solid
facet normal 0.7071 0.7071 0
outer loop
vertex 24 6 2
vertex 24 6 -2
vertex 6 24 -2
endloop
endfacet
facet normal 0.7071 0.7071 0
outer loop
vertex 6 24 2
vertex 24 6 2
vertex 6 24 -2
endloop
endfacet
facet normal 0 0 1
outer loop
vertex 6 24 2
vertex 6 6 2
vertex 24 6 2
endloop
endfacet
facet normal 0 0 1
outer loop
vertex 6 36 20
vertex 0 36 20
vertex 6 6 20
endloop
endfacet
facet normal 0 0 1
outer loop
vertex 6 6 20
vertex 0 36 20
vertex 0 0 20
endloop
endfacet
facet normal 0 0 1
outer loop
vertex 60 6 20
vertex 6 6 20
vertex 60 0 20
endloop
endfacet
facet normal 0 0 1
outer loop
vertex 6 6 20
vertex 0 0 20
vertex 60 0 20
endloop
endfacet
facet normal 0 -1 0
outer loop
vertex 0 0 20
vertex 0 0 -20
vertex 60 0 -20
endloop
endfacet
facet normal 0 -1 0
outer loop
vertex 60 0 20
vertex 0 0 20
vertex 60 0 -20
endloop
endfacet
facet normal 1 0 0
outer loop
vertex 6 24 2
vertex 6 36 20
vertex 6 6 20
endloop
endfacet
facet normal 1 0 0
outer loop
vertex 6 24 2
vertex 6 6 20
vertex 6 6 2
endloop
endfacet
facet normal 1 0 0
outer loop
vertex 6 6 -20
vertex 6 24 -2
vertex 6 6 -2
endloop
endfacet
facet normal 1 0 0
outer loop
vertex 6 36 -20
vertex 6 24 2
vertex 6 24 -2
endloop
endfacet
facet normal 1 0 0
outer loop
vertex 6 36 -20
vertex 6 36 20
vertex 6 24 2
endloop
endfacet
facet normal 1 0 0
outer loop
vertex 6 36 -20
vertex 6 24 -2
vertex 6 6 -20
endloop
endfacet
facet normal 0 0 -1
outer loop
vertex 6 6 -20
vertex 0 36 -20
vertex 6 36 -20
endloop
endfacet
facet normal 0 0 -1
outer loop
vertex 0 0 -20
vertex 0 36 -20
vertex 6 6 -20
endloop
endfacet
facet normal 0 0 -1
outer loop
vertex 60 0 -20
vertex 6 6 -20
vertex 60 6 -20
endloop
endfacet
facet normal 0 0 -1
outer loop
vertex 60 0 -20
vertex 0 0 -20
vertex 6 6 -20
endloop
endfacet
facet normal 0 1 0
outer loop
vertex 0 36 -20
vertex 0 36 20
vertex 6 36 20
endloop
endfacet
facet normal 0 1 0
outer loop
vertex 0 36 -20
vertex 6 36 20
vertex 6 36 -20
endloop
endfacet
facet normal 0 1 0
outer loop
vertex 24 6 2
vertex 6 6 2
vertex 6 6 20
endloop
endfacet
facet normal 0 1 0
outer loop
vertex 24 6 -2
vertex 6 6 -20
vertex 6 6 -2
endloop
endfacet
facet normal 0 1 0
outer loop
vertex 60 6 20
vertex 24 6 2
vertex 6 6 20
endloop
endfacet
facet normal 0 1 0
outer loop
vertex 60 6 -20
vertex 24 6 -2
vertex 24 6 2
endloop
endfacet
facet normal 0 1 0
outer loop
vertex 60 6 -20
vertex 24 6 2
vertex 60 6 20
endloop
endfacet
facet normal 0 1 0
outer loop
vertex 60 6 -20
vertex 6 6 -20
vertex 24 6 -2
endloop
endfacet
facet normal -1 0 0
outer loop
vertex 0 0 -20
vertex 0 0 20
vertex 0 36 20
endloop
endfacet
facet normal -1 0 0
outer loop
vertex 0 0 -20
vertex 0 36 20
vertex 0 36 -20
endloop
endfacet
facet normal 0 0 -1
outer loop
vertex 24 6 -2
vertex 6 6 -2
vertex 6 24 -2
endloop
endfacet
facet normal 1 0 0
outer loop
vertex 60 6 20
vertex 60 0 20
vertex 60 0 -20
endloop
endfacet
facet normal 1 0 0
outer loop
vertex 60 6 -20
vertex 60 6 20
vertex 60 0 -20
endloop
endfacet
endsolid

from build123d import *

# Parameters (mm, degrees)
SKETCH_1_W      = 60
SKETCH_1_H      = 40
EXTRUDE_1_DEPTH = 6
SKETCH_2_W      = 40
SKETCH_2_H      = 36
EXTRUDE_2_DEPTH = 6
EXTRUDE_START   = -2
EXTRUDE_3_DEPTH = 4


# Read off the part's stored shape, not the designer's step: 凸台-拉伸3
with BuildPart() as part:
    # 草图1 → 凸台-拉伸1 (new body)
    with BuildSketch(Plane(origin=(0, 0, 0), x_dir=(1, 0, 0), z_dir=(0, 1, 0))):
        with Locations((30, 0)):
            Rectangle(SKETCH_1_W, SKETCH_1_H)
    extrude(amount=EXTRUDE_1_DEPTH)

    # 草图2 → 凸台-拉伸2 (add)
    with BuildSketch(Plane(origin=(0, 0, 0), x_dir=(0, 0, -1), z_dir=(1, 0, 0))):
        with Locations((0, 18)):
            Rectangle(SKETCH_2_W, SKETCH_2_H)
    extrude(amount=EXTRUDE_2_DEPTH)

    # 凸台-拉伸3 outline → 凸台-拉伸3 (add)
    with BuildSketch(Plane.XY.offset(EXTRUDE_START)):
        Polygon((24, 6), (6, 24), (6, 6), align=None)
    extrude(amount=EXTRUDE_3_DEPTH)


solid = part.part
